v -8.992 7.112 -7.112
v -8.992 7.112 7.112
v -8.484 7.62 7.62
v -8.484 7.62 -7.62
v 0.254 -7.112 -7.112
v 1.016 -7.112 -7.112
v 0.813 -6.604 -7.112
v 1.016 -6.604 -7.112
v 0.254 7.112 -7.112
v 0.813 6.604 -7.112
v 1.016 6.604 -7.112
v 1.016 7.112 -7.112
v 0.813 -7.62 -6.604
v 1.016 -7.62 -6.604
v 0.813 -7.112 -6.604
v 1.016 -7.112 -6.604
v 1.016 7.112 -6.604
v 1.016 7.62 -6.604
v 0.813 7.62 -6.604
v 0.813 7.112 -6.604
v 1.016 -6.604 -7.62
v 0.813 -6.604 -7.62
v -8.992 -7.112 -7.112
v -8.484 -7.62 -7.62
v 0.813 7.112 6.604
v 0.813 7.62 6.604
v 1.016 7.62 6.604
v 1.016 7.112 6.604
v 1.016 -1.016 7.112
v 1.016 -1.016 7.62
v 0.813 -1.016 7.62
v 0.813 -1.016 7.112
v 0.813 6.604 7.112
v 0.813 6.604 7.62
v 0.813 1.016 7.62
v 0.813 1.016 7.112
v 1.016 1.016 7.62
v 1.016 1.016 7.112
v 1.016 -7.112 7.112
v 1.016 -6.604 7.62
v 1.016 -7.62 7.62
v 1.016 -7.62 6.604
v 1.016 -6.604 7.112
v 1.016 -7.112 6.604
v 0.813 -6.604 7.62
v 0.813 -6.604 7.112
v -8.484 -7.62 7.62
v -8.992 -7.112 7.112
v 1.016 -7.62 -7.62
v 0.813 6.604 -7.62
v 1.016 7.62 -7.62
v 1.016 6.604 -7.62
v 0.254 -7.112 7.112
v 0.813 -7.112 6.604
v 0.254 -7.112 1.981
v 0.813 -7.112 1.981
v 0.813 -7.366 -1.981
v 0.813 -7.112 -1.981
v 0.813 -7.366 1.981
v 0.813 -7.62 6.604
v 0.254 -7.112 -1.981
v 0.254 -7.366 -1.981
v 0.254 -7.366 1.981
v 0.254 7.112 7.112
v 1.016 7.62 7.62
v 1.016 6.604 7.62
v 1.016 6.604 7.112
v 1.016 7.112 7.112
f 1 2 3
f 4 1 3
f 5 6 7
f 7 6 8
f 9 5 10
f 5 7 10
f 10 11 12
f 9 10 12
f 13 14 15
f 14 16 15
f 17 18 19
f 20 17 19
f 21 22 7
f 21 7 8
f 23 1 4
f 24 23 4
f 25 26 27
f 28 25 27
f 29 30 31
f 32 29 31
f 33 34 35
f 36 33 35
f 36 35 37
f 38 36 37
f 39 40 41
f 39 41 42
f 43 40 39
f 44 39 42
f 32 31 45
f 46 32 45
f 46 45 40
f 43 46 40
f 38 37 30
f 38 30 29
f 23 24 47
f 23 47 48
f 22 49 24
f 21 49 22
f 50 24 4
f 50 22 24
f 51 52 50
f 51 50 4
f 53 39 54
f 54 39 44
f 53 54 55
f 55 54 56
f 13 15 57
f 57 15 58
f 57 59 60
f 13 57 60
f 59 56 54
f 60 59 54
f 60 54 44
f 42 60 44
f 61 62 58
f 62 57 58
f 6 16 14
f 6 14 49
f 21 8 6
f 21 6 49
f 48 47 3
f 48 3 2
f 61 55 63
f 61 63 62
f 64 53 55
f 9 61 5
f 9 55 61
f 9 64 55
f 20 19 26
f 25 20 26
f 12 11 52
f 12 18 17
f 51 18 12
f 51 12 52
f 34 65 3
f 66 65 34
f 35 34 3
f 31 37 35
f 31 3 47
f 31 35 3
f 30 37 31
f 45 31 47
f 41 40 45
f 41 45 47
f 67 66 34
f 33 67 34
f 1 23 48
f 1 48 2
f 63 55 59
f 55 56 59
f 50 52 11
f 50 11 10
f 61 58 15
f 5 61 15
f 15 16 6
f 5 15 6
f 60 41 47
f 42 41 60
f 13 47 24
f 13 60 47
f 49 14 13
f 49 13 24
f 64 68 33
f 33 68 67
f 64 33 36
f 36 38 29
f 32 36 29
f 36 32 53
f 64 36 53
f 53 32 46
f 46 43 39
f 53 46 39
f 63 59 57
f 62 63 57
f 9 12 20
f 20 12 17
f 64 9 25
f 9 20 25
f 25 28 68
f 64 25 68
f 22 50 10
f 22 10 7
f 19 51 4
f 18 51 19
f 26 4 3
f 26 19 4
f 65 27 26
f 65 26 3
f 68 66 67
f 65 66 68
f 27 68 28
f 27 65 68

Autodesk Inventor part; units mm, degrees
sketch "Sketch_2" plane through (1.016, 0, 0) normal (1, 0, 0) x (0, 0, -1)
  line L0 (-7.62, -7.62) -> (7.62, -7.62)
  line L1 (7.62, -7.62) -> (7.62, 7.62)
  line L2 (7.62, 7.62) -> (-7.62, 7.62)
  line L3 (-7.62, 7.62) -> (-7.62, -7.62)
extrude "Extrusion1" add sketch "Sketch_2" against normal blind 10.0076
sketch "Sketch_1" plane through (1.016, 0, 0) normal (1, 0, 0) x (0, 0, -1)
  line L0 (-7.112, -7.112) -> (-1.9812, -7.112)
  line L1 (-1.9812, -7.112) -> (-1.9812, -7.366)
  line L2 (-1.9812, -7.366) -> (1.9812, -7.366)
  line L3 (1.9812, -7.366) -> (1.9812, -7.112)
  line L4 (1.9812, -7.112) -> (7.112, -7.112)
  line L5 (7.112, -7.112) -> (7.112, 7.112)
  line L6 (7.112, 7.112) -> (-7.112, 7.112)
  line L7 (-7.112, 7.112) -> (-7.112, -7.112)
extrude "Extrusion2" cut sketch "Sketch_1" against normal blind 0.762
sketch "Sketch_3" plane through (0, 0, 0) normal (0, 0, 1) x (1, 0, 0)
  line L0 (-18.9992, 7.62) -> (-18.9992, -7.62)
  line L1 (-18.9992, -7.62) -> (-8.4836, -7.62)
  line L2 (-8.4836, -7.62) -> (-8.9916, -7.112)
  line L3 (-8.9916, -7.112) -> (-8.9916, 7.112)
  line L4 (-8.9916, 7.112) -> (-8.4836, 7.62)
  line L5 (-8.4836, 7.62) -> (-18.9992, 7.62)
extrude "Extrusion3" cut sketch "Sketch_3" along normal mid plane 15.24
sketch "Sketch_4" plane through (0, 0, 0) normal (0, 1, 0) x (-1, 0, 0)
  line L0 (18.9992, -7.62) -> (18.9992, 7.62)
  line L1 (18.9992, 7.62) -> (8.4836, 7.62)
  line L2 (8.4836, 7.62) -> (8.9916, 7.112)
  line L3 (8.9916, 7.112) -> (8.9916, -7.112)
  line L4 (8.9916, -7.112) -> (8.4836, -7.62)
  line L5 (8.4836, -7.62) -> (18.9992, -7.62)
extrude "Extrusion4" cut sketch "Sketch_4" along normal mid plane 15.24
sketch "Sketch_5" plane through (0, 7.62, 0) normal (0, 1, 0) x (1, 0, 0)
  line L0 (0.8128, 6.604) -> (0.8128, -6.604)
  line L1 (0.8128, -6.604) -> (1.016, -6.604)
  line L2 (1.016, -6.604) -> (1.016, 6.604)
  line L3 (1.016, 6.604) -> (0.8128, 6.604)
extrude "Extrusion5" cut sketch "Sketch_5" against normal blind 15.24
sketch "Sketch_6" plane through (0, 0, -7.62) normal (0, 0, 1) x (1, 0, 0)
  line L0 (0.8128, 6.604) -> (0.8128, -6.604)
  line L1 (0.8128, -6.604) -> (1.016, -6.604)
  line L2 (1.016, -6.604) -> (1.016, 6.604)
  line L3 (1.016, 6.604) -> (0.8128, 6.604)
extrude "Extrusion6" cut sketch "Sketch_6" along normal blind 0.508
sketch "Sketch_7" plane through (0, 0, 7.62) normal (0, 0, 1) x (1, 0, 0)
  line L0 (0.8128, 6.604) -> (0.8128, 1.016)
  line L1 (0.8128, 1.016) -> (1.016, 1.016)
  line L2 (1.016, 1.016) -> (1.016, 6.604)
  line L3 (1.016, 6.604) -> (0.8128, 6.604)
extrude "Extrusion7" cut sketch "Sketch_7" against normal blind 0.508
sketch "Sketch_8" plane through (0, 0, 7.62) normal (0, 0, 1) x (1, 0, 0)
  line L0 (0.8128, -1.016) -> (0.8128, -6.604)
  line L1 (0.8128, -6.604) -> (1.016, -6.604)
  line L2 (1.016, -6.604) -> (1.016, -1.016)
  line L3 (1.016, -1.016) -> (0.8128, -1.016)
extrude "Extrusion8" cut sketch "Sketch_8" against normal blind 0.508
ref_plane "body_to_dummy_sk_XY" through (-11.4046, 0, 0) normal (-1, 0, 0) x (0, 0, -1)
ref_plane "body_to_dummy_sk_YZ" through (-11.4046, 0, 0) normal (0, 0, -1) x (0, -1, 0)
ref_plane "body_to_dummy_sk_ZX" through (-11.4046, 0, 0) normal (0, -1, 0) x (-1, 0, 0)
ref_plane "body_to_dummy_sk_green_XY" through (-11.4046, 0, -3.7529) normal (-1, 0, 0) x (0, 0, -1)
ref_plane "body_to_dummy_sk_green_YZ" through (-11.4046, 0, -3.7529) normal (0, 0, -1) x (0, -1, 0)
ref_plane "body_to_dummy_sk_green_ZX" through (-11.4046, 0, -3.7529) normal (0, -1, 0) x (-1, 0, 0)
ref_plane "body_to_dummy_sk_red_XY" through (-11.4046, 0, 3.7529) normal (-1, 0, 0) x (0, 0, -1)
ref_plane "body_to_dummy_sk_red_YZ" through (-11.4046, 0, 3.7529) normal (0, 0, -1) x (0, -1, 0)
ref_plane "body_to_dummy_sk_red_ZX" through (-11.4046, 0, 3.7529) normal (0, -1, 0) x (-1, 0, 0)
ref_plane "body_to_pole_XY" through (-0.508, 0, 0) normal (-1, 0, 0) x (0, 0, -1)
ref_plane "body_to_pole_YZ" through (-0.508, 0, 0) normal (0, 0, -1) x (0, -1, 0)
ref_plane "body_to_pole_ZX" through (-0.508, 0, 0) normal (0, -1, 0) x (-1, 0, 0)
properties part number "UB21SK035D-1JBbody"
